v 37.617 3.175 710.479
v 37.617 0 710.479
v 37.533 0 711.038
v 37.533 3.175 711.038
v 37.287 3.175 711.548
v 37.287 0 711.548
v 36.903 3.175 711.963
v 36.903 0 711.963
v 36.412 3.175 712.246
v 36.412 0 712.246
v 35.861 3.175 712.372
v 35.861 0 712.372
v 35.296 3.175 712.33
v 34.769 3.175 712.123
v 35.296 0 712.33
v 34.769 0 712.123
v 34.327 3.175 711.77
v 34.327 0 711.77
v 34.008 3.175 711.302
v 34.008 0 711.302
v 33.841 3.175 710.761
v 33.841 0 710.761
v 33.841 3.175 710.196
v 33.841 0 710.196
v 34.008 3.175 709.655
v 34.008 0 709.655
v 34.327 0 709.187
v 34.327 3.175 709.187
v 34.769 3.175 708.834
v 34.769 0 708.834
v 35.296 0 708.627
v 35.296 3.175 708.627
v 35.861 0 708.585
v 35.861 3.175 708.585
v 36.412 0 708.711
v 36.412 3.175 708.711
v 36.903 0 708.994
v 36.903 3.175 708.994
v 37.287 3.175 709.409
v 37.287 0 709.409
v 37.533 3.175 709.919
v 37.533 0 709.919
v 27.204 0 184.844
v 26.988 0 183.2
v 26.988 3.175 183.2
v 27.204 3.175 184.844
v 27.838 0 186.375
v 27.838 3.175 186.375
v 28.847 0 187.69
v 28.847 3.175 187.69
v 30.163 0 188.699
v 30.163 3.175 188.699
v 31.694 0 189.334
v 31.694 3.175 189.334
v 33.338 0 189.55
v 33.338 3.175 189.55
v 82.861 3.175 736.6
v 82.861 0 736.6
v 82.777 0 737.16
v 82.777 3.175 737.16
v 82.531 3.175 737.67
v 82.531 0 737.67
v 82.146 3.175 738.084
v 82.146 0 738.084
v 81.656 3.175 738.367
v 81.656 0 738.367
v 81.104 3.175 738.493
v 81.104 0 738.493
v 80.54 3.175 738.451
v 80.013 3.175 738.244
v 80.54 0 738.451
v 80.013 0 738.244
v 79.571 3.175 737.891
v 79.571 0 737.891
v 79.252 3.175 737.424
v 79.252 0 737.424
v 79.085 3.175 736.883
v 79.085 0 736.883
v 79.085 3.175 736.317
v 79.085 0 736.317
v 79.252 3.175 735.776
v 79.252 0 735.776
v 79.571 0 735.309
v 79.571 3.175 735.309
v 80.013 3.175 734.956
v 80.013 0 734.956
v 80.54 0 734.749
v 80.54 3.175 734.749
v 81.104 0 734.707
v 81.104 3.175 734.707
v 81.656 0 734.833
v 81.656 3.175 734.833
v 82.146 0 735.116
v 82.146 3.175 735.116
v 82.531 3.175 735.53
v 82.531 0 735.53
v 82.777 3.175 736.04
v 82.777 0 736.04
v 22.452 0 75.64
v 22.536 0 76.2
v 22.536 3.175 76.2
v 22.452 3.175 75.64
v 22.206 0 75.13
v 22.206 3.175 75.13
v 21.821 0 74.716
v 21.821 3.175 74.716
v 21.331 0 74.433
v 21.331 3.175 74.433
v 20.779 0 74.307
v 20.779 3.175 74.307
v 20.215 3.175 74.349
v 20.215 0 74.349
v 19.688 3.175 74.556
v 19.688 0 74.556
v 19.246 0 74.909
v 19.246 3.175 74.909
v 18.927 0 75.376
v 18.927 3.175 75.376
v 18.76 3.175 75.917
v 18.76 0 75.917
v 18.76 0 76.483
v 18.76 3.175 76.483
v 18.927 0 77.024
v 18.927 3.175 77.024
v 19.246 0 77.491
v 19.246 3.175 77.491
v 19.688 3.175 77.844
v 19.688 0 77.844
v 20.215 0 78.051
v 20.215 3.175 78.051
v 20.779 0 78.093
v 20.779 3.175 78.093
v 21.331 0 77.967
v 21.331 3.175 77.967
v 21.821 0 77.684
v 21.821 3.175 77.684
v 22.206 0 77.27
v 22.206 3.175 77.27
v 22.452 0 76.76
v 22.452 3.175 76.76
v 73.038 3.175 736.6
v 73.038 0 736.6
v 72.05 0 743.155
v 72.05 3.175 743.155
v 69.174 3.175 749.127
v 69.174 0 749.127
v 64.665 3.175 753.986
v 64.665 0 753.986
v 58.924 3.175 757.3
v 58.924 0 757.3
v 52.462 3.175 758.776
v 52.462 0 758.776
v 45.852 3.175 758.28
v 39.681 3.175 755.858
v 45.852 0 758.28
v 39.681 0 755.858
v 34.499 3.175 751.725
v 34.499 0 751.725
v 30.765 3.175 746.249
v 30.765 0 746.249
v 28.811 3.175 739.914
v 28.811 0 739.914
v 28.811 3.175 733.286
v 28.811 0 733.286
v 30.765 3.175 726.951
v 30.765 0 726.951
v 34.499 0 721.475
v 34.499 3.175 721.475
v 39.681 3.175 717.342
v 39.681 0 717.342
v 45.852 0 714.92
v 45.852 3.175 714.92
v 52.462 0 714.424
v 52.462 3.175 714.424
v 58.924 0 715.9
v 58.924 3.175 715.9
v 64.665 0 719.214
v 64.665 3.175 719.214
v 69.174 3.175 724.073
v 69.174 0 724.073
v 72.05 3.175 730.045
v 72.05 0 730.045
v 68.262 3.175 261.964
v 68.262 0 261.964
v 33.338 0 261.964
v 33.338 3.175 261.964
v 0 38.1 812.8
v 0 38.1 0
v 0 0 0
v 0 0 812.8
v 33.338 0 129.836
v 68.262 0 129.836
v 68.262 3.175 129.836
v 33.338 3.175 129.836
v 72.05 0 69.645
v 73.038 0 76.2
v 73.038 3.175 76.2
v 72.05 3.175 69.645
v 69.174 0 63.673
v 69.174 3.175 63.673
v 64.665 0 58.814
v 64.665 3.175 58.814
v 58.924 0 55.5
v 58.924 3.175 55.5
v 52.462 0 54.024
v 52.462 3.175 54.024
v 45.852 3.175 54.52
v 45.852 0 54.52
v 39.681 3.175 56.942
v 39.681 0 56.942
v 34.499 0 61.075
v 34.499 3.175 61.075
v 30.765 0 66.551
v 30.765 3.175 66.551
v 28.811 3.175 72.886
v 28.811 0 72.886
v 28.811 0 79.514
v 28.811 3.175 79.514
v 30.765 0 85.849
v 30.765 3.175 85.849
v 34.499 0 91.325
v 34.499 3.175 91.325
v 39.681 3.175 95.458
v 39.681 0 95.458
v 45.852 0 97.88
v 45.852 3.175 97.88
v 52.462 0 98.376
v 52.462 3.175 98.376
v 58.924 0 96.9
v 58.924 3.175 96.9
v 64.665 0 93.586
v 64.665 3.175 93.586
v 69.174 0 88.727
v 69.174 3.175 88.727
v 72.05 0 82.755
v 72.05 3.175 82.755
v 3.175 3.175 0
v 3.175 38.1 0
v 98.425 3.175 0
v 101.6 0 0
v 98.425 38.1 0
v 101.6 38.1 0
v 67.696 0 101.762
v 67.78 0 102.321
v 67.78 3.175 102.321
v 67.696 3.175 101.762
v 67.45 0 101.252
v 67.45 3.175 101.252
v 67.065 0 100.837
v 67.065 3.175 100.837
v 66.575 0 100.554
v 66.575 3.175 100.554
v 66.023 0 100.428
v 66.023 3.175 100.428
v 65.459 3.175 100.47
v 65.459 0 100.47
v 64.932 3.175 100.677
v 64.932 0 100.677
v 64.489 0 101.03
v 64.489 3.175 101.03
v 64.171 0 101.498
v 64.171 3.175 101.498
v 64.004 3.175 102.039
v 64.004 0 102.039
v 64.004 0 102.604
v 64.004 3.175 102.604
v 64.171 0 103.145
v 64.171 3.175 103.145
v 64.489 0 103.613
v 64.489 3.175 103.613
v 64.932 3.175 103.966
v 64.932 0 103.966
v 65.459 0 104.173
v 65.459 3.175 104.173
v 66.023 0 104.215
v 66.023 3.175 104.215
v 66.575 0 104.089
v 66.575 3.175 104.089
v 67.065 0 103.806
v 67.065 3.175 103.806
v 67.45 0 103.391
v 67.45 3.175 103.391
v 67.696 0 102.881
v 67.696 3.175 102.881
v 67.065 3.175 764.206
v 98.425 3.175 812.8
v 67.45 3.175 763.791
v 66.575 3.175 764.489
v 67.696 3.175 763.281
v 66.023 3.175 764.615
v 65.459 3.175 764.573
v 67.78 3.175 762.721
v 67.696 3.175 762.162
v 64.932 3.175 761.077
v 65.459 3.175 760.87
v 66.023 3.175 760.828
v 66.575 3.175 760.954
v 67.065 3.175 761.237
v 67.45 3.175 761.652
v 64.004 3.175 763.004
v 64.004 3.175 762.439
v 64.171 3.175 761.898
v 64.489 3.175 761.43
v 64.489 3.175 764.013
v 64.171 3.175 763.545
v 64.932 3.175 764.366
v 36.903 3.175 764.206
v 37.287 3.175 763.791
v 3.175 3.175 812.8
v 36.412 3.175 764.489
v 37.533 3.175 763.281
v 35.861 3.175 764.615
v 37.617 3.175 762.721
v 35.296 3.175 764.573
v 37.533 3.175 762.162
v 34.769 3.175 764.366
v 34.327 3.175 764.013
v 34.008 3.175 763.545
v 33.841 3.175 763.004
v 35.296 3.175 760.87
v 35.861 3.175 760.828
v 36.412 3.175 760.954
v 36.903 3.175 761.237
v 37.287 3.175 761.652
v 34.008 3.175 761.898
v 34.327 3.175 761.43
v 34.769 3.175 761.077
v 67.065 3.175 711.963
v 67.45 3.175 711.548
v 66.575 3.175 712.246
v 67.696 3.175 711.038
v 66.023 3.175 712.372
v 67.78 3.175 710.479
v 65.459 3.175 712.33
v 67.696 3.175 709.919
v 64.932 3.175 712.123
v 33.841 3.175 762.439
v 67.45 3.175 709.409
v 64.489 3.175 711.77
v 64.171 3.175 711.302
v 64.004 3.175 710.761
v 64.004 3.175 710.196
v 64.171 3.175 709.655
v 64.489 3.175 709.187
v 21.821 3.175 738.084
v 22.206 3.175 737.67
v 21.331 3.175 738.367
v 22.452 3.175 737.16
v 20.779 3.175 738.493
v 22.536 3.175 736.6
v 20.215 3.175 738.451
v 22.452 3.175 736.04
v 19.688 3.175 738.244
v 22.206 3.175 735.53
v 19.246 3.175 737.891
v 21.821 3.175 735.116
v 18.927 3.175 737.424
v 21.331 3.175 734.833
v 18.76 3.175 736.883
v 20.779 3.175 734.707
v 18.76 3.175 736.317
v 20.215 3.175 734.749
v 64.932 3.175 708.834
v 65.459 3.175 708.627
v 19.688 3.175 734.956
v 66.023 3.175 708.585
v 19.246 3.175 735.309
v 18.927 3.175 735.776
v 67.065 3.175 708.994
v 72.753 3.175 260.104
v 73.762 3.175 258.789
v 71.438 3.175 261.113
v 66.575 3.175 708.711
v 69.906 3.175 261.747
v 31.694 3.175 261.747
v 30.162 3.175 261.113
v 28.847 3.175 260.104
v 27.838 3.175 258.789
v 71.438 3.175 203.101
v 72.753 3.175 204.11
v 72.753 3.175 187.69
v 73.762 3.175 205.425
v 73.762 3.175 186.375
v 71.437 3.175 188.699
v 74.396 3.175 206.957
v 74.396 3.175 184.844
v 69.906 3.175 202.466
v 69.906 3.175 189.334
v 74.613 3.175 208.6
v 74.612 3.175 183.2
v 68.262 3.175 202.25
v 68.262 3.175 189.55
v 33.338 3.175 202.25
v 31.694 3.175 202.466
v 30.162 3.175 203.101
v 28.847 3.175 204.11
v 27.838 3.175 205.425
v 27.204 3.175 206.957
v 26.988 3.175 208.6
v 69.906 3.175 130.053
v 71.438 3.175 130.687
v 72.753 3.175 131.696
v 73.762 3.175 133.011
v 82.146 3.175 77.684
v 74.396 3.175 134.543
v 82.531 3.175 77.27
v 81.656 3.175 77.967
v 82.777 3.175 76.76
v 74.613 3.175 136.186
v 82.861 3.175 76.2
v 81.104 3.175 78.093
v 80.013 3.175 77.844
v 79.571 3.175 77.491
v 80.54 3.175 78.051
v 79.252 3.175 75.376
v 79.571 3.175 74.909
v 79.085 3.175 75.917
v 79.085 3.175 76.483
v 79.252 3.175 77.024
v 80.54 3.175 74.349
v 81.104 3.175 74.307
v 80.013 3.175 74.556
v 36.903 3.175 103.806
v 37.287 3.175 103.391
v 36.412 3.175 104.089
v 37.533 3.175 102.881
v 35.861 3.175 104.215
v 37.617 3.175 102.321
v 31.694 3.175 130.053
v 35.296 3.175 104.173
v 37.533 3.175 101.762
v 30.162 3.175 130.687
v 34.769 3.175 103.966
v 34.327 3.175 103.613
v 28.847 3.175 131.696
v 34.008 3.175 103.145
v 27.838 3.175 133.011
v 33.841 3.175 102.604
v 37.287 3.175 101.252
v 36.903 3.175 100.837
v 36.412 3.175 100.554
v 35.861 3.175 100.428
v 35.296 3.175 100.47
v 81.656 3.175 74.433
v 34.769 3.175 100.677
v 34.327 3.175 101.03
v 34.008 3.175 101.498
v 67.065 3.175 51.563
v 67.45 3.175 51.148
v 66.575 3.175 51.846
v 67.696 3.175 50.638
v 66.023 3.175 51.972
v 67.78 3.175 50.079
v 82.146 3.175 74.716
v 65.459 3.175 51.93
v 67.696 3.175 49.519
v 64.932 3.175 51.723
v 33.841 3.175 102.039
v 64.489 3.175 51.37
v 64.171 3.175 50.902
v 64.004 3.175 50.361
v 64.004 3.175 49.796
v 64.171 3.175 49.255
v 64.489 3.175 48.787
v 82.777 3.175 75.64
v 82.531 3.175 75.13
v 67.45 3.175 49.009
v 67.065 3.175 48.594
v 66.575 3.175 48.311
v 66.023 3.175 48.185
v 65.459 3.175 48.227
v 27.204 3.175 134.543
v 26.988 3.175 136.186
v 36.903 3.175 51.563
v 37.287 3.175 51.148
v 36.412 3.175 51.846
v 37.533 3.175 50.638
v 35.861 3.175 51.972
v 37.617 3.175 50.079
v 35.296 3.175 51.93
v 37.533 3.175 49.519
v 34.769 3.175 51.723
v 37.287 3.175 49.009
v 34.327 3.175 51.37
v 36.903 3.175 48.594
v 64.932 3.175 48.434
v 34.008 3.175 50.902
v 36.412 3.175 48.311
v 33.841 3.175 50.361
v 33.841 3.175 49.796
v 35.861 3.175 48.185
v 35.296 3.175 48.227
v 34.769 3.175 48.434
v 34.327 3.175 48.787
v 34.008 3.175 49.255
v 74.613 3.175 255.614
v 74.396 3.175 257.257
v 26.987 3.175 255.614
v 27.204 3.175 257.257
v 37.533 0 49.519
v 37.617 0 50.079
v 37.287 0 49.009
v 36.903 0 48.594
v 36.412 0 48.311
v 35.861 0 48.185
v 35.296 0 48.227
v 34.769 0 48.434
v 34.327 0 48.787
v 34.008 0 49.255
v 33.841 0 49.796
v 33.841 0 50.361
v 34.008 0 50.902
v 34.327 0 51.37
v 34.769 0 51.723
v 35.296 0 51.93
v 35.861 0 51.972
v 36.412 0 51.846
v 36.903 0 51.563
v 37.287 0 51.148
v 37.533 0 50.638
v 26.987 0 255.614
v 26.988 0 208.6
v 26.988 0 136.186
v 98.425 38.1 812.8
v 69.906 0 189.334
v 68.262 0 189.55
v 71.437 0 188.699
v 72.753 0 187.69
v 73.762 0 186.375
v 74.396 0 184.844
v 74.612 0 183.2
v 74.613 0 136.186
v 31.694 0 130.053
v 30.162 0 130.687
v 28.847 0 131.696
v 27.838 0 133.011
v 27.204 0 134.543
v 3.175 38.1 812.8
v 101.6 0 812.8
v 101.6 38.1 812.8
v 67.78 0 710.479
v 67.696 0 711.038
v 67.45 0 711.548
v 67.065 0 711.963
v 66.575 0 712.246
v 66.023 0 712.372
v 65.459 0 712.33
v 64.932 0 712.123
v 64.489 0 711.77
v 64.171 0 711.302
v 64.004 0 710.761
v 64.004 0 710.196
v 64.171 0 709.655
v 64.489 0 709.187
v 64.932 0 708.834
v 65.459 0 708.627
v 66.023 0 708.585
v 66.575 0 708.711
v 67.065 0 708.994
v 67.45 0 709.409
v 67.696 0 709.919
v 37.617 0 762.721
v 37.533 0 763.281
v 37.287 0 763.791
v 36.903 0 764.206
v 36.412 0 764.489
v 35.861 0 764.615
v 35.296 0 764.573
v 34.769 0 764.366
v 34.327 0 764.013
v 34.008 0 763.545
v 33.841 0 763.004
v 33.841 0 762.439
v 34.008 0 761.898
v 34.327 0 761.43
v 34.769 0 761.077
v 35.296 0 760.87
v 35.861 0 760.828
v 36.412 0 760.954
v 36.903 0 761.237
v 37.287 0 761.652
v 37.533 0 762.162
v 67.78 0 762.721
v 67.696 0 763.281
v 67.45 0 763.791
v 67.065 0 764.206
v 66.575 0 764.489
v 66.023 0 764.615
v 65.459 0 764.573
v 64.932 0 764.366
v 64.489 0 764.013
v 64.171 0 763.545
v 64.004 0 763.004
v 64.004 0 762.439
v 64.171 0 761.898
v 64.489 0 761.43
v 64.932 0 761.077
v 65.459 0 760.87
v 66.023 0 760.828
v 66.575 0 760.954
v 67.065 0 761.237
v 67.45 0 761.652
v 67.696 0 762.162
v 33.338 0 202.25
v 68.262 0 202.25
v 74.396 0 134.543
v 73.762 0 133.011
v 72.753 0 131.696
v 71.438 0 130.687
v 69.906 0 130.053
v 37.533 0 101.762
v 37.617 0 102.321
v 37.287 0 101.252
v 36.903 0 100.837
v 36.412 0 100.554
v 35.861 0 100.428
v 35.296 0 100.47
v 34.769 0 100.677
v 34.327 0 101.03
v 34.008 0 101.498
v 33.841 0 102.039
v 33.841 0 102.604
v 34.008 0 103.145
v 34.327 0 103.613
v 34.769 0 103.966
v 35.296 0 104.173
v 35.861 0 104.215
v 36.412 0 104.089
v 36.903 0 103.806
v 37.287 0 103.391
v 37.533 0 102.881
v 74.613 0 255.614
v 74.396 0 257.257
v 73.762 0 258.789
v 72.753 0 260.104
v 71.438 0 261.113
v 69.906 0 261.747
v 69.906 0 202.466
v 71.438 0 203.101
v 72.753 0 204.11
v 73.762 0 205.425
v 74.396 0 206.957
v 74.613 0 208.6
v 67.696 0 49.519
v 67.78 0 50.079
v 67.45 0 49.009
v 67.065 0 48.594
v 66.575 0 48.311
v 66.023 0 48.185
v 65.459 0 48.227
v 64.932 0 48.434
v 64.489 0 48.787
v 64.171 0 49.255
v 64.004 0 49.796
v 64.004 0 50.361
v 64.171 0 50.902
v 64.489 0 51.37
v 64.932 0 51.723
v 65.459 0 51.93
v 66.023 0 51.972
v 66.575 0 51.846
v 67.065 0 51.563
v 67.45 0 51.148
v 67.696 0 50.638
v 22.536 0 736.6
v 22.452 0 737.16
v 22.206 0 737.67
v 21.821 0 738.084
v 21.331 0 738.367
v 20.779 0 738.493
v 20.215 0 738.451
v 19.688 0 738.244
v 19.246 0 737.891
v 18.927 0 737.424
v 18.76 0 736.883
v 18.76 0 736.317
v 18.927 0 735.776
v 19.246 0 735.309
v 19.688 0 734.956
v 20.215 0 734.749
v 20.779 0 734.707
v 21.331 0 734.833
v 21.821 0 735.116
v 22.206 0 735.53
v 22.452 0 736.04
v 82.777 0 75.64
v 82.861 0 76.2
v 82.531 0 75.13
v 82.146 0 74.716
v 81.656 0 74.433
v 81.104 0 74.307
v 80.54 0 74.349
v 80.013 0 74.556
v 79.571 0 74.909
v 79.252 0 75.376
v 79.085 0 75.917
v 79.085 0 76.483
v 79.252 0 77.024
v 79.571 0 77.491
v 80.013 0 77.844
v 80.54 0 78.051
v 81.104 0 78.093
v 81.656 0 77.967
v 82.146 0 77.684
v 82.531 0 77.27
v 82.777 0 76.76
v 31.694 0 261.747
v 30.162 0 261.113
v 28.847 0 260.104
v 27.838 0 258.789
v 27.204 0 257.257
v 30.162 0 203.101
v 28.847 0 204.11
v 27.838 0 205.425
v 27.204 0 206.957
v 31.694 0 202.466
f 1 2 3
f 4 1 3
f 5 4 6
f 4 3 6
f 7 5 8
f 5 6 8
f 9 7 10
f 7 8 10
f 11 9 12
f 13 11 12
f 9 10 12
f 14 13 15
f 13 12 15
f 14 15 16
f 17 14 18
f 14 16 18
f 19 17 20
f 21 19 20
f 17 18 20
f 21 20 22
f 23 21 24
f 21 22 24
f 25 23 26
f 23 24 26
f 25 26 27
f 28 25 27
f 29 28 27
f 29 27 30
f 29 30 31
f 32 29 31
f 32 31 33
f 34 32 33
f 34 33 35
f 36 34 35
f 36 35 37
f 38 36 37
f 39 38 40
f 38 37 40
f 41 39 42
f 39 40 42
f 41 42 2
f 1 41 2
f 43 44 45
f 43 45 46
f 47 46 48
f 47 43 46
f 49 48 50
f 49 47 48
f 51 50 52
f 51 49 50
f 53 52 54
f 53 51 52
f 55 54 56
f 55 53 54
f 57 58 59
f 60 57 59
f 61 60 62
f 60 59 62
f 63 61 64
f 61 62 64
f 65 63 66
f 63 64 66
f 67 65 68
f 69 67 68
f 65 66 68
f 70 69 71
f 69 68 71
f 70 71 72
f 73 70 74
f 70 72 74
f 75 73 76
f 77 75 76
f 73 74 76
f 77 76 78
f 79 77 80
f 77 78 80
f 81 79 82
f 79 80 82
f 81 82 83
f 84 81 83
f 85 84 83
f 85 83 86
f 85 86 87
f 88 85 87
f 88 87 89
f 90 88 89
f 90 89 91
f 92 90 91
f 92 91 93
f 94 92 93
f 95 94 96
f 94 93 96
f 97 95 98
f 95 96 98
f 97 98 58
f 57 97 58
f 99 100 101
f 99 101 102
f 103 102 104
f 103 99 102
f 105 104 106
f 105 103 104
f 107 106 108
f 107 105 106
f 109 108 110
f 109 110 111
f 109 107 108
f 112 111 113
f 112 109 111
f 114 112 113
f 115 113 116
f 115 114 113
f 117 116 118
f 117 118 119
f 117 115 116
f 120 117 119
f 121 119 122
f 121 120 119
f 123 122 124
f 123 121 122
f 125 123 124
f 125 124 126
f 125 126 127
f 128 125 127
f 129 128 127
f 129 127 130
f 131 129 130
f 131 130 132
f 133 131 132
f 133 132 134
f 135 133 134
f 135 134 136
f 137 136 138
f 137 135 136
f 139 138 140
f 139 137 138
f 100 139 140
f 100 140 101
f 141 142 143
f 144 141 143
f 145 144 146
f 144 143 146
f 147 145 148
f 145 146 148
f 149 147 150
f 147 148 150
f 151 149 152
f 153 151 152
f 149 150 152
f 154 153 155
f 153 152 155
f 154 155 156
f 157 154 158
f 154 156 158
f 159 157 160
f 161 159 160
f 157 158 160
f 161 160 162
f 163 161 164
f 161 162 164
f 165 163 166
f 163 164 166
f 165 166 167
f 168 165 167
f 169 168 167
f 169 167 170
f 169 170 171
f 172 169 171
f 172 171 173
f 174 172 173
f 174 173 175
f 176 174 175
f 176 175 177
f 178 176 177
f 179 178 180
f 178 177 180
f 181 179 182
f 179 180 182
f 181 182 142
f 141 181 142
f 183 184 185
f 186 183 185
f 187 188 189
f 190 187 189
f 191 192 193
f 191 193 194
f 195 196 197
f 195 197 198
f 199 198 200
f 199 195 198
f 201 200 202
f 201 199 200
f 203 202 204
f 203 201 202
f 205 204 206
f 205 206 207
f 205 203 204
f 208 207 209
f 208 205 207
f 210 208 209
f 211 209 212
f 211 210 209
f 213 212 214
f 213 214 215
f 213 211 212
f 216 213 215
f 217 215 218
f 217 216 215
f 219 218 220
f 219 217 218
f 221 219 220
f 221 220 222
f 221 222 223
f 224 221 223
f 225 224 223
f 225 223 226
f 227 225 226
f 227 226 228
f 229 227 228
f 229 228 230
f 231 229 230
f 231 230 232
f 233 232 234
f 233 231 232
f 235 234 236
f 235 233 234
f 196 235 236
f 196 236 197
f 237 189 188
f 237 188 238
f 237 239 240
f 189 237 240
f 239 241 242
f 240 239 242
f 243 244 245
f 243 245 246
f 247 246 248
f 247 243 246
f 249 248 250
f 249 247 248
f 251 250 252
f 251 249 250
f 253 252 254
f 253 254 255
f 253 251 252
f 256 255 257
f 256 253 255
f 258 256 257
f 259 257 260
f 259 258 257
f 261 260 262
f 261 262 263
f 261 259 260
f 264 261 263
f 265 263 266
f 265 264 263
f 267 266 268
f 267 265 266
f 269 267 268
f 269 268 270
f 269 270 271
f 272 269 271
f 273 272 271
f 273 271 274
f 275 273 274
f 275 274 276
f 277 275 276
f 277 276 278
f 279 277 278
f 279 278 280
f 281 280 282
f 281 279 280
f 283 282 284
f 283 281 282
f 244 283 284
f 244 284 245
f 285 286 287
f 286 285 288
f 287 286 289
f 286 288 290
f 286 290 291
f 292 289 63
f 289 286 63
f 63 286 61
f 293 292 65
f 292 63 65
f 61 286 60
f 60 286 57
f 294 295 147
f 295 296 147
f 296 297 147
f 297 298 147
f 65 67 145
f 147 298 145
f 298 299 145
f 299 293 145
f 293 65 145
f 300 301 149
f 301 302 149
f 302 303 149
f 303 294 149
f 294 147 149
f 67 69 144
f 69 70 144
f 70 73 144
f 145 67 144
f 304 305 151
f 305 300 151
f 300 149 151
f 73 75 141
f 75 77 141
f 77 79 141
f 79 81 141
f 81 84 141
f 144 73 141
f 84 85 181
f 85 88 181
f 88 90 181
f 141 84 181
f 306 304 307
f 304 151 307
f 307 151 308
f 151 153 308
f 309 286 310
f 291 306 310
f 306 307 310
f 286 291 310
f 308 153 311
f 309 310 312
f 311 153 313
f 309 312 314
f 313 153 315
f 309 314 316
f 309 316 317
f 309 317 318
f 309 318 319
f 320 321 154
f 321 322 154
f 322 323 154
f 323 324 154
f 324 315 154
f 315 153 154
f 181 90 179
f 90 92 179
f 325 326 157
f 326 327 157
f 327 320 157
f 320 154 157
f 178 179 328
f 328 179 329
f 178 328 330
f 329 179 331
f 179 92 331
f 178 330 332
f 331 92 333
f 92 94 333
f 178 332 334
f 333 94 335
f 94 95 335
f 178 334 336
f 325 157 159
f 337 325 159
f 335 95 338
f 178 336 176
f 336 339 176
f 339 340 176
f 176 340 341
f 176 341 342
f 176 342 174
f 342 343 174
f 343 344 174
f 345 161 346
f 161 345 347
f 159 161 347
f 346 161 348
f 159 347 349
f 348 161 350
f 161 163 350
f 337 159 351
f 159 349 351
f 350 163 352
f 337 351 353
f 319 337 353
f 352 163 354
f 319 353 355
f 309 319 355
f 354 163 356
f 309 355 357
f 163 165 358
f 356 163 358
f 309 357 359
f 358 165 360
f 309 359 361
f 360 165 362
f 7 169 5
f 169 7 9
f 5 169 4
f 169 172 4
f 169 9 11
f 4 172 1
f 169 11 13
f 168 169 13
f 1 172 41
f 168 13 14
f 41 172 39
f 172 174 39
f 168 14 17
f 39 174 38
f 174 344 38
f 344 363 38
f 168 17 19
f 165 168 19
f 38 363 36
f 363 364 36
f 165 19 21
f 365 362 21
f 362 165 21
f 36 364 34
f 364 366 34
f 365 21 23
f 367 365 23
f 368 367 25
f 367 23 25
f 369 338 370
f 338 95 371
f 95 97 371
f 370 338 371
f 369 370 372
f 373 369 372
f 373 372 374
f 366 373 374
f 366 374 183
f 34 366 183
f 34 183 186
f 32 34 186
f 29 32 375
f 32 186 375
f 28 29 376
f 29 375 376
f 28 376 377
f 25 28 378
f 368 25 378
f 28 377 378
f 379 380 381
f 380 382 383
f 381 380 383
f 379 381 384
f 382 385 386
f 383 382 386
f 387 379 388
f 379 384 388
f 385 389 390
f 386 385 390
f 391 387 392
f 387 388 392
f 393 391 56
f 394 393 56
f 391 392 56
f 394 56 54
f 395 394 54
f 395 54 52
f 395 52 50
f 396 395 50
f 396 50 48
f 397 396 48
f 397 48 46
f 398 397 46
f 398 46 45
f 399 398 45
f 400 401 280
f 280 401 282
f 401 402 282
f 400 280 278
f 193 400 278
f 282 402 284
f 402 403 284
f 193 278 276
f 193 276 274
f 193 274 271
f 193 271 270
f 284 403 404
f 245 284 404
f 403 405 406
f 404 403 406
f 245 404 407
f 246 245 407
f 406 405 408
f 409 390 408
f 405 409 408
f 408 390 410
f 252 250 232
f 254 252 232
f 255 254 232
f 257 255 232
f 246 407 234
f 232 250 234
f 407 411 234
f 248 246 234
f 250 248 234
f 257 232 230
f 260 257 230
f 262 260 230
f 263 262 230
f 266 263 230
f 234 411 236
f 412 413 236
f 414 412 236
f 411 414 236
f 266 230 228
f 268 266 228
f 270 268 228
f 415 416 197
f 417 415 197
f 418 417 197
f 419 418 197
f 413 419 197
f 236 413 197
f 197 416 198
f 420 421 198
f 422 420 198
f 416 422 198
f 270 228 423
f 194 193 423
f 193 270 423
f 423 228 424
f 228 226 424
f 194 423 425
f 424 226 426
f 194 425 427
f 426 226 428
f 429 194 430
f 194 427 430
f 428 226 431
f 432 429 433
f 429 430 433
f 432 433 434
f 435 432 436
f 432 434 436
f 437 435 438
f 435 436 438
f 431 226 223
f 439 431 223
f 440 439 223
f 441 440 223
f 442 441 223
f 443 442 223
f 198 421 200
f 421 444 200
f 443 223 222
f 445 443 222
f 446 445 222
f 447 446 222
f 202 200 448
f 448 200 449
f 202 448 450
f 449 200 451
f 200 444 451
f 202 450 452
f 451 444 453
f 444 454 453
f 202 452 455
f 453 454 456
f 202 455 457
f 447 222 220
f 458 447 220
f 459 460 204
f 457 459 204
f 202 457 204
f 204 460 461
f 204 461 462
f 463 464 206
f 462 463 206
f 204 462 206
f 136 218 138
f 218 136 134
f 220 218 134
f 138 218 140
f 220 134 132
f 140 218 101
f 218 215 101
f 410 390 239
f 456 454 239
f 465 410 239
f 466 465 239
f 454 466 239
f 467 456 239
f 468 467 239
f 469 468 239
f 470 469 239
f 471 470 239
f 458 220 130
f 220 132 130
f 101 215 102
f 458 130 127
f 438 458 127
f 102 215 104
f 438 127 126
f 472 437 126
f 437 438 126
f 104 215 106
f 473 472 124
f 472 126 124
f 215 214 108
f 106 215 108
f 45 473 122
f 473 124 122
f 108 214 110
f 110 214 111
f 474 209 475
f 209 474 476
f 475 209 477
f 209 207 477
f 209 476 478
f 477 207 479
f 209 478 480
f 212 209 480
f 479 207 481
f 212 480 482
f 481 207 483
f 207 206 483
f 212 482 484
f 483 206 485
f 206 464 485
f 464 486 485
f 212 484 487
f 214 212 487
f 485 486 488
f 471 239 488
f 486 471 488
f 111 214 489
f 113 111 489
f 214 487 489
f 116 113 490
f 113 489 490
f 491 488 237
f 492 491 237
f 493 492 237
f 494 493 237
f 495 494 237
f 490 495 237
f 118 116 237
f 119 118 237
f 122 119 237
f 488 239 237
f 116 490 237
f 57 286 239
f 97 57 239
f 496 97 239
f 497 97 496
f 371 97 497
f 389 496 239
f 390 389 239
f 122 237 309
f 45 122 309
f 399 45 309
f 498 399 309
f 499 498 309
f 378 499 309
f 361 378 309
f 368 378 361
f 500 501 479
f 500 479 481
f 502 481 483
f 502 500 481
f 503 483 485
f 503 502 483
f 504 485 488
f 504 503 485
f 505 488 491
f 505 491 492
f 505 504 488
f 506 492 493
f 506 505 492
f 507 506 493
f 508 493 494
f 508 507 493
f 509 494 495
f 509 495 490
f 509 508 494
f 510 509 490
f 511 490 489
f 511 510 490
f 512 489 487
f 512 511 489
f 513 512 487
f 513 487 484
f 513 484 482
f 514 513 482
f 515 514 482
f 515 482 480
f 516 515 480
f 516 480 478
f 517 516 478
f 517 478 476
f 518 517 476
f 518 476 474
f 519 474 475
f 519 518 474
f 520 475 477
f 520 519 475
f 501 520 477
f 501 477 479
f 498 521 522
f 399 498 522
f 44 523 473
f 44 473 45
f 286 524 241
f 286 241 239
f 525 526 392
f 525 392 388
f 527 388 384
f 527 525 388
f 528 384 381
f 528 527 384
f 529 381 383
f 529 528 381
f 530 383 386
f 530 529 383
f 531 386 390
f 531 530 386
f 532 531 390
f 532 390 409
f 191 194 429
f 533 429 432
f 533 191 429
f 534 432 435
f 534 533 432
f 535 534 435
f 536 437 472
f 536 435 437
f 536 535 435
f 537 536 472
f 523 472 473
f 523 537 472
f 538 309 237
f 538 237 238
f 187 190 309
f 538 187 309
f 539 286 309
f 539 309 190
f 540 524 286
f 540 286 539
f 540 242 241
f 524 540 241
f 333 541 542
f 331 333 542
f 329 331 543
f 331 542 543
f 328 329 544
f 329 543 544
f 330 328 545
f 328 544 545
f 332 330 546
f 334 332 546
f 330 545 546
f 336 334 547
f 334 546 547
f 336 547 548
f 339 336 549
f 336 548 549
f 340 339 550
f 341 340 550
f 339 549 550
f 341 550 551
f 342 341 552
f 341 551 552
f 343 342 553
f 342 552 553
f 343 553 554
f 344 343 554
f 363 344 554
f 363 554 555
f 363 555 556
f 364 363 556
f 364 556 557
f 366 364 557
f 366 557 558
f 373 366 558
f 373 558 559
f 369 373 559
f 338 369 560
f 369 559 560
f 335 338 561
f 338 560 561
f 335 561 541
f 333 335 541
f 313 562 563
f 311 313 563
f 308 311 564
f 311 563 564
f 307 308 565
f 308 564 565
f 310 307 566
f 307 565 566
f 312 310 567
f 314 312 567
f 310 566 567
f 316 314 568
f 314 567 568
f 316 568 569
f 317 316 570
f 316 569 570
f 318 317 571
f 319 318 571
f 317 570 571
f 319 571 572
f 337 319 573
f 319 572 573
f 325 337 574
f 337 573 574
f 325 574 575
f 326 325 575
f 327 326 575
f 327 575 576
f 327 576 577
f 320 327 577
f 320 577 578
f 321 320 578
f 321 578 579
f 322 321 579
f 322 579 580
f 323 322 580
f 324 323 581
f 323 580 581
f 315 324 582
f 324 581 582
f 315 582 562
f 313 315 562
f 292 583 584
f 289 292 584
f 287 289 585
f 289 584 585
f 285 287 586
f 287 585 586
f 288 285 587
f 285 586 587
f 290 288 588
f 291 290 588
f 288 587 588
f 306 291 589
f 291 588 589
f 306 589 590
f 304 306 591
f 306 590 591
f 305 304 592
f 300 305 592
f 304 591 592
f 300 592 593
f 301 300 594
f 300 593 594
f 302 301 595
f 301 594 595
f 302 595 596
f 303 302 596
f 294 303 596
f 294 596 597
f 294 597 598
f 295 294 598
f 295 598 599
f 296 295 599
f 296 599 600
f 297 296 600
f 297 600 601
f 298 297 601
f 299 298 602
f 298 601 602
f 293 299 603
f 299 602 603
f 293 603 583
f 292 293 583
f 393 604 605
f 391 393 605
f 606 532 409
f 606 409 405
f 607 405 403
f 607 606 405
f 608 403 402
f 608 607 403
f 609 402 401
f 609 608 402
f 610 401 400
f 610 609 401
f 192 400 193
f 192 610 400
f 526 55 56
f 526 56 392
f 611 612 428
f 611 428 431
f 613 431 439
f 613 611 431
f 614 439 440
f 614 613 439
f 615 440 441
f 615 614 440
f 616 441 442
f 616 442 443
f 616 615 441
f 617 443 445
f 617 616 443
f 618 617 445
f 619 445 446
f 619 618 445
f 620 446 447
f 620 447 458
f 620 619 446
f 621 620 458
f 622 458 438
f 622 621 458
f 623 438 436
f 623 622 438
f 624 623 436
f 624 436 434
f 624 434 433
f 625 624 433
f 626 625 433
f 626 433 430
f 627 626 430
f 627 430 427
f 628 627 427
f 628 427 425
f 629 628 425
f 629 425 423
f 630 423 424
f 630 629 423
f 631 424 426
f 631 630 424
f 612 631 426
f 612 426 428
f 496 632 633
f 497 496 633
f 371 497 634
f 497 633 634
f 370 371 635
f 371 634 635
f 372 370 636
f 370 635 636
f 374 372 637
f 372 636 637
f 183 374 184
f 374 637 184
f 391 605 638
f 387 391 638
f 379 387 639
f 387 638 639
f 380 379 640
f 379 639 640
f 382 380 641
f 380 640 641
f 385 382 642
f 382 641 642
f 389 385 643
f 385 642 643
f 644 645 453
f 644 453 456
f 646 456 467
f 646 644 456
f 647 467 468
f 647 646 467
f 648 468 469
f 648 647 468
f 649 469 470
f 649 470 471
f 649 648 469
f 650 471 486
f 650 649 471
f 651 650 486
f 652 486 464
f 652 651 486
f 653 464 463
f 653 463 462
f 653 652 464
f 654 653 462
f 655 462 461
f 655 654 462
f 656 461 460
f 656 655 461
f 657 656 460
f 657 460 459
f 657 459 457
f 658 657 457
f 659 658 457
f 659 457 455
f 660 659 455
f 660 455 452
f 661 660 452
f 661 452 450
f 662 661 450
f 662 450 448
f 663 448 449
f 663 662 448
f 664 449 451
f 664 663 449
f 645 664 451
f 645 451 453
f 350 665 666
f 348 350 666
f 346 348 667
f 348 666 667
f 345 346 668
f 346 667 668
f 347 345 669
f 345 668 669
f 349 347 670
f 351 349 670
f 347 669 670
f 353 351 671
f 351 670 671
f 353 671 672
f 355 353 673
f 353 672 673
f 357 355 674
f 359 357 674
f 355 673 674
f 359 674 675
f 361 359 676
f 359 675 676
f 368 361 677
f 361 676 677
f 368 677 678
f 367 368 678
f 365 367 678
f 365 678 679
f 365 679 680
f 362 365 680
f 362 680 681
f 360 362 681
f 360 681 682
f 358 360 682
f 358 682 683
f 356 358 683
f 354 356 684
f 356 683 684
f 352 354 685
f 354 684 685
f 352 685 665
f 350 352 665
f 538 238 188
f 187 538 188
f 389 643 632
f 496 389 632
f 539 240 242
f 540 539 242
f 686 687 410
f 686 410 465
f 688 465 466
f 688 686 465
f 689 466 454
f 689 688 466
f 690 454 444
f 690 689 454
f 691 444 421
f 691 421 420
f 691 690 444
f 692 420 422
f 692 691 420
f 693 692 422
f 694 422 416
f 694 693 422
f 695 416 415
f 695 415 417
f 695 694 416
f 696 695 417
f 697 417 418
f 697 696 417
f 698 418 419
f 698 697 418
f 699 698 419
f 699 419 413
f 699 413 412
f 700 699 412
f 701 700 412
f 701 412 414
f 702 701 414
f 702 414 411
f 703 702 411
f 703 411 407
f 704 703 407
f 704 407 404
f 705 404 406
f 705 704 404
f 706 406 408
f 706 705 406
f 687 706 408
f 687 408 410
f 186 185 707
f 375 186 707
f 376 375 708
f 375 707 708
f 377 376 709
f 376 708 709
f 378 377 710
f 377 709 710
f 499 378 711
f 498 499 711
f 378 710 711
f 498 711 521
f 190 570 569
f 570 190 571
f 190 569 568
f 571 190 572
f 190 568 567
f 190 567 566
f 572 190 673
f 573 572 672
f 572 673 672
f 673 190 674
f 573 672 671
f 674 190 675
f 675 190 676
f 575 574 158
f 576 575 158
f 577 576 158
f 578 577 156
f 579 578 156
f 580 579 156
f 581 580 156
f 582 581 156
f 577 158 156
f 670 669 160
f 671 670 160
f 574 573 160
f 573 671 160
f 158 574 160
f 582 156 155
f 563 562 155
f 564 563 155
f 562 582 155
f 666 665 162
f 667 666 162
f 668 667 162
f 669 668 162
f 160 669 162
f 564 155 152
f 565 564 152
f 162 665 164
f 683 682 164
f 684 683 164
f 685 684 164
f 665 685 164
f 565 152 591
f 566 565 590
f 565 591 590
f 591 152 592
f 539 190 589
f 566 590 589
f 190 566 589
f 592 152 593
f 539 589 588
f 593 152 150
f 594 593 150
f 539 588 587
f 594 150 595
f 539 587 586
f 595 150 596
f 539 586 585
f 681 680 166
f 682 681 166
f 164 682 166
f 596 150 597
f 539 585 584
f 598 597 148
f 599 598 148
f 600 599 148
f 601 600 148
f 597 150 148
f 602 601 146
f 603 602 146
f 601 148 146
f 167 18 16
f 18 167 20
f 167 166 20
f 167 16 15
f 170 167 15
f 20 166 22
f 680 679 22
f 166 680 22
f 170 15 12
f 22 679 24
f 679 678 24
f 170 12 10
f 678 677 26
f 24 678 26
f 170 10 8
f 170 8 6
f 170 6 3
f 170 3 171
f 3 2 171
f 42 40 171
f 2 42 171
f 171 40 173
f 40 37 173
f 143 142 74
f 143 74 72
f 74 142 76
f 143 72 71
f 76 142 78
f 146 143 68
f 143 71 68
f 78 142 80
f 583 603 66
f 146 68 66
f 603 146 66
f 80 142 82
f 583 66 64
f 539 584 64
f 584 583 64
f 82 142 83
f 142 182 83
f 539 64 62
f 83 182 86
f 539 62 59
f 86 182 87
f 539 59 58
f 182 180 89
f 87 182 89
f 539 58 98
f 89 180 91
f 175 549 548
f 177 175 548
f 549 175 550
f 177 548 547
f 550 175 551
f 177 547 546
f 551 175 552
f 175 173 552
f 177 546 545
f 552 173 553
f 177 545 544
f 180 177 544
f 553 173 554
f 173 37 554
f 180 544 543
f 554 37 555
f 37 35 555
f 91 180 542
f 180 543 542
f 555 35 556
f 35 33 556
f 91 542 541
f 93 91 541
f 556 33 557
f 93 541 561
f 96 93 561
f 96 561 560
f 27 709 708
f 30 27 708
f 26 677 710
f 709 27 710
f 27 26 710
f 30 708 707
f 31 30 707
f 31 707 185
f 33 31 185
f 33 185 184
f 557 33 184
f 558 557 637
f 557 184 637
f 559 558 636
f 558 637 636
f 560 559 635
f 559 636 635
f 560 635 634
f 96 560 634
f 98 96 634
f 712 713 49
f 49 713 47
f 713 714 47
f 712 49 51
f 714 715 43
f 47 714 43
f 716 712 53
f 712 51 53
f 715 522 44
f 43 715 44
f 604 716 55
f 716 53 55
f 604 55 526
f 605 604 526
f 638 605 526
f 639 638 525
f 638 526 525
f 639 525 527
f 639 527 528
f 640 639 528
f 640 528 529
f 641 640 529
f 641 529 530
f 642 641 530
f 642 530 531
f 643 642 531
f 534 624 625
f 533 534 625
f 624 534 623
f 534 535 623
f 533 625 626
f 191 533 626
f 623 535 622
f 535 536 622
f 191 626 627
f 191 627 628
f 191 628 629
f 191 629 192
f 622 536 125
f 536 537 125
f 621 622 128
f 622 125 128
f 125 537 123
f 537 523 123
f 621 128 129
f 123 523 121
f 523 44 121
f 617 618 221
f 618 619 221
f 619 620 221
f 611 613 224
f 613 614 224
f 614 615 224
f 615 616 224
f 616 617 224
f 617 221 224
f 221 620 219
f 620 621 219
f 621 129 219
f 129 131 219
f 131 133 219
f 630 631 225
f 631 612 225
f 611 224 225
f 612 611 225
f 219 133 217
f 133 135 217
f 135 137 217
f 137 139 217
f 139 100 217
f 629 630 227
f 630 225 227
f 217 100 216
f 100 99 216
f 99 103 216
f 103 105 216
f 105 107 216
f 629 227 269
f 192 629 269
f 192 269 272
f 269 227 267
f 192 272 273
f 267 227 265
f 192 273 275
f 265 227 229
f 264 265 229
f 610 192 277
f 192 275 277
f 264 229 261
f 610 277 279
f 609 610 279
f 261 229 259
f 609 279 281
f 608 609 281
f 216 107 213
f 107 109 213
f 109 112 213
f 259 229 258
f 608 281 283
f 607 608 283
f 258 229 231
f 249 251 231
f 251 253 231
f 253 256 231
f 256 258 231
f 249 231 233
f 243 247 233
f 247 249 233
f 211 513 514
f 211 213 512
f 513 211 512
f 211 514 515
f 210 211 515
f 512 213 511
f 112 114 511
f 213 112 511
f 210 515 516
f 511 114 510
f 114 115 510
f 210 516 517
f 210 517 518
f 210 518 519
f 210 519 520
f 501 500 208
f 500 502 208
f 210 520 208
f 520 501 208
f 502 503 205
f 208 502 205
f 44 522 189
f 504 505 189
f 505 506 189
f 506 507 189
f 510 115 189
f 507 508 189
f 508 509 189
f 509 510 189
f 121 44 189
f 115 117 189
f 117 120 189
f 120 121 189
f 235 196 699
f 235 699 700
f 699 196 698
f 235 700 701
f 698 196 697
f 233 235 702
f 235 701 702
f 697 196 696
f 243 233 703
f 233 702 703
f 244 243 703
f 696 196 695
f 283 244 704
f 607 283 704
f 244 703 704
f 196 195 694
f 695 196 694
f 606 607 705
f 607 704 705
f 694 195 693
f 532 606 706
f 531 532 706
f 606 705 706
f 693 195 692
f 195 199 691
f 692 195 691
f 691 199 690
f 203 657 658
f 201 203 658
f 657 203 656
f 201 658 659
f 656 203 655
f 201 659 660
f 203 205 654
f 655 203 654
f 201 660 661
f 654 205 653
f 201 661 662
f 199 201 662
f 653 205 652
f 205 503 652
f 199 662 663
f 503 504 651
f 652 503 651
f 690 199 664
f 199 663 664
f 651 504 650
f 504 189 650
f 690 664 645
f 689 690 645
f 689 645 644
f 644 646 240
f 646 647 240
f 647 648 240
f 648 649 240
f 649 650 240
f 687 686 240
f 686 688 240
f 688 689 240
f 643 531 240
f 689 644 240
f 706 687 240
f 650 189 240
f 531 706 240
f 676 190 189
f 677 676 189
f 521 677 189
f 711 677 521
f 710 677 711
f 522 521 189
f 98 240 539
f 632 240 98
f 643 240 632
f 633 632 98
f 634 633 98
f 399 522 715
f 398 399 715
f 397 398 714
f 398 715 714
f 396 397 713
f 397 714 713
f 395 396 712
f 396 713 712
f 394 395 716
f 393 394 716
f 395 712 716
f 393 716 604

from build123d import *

# Parameters (mm, degrees)
BOSS_EXTRUDE1_DEPTH = 812.8
SKETCH2_R           = 22.2377
CUT_EXTRUDE1_DEPTH  = 3.175
SKETCH3_R           = 1.89865
CUT_EXTRUDE2_DEPTH  = 3.175
CUT_EXTRUDE3_REACH  = 40.1


with BuildPart() as part:
    # Sketch1 → Boss-Extrude1 (new body)
    with BuildSketch(Plane.XY):
        Polygon((3.175, 3.175), (3.175, 38.1), (0, 38.1), (0, 0), (101.6, 0), (101.6, 38.1), (98.425, 38.1), (98.425, 3.175), align=None)
    extrude(amount=BOSS_EXTRUDE1_DEPTH)

    # Sketch2 → Cut-Extrude1 (cut)
    with BuildSketch(Plane.XZ):
        with Locations((50.8, 736.6)):
            Circle(SKETCH2_R)
    cut_extrude1 = extrude(amount=-CUT_EXTRUDE1_DEPTH, mode=Mode.SUBTRACT)

    # Sketch3 → Cut-Extrude2 (cut)
    with BuildSketch(Plane.XZ):
        with Locations((65.88125, 762.721491242)):
            Circle(SKETCH3_R)
        with Locations((80.9625, 736.6)):
            Circle(SKETCH3_R)
        with Locations((65.88125, 710.478508758)):
            Circle(SKETCH3_R)
        with Locations((35.71875, 710.478508758)):
            Circle(SKETCH3_R)
        with Locations((20.6375, 736.6)):
            Circle(SKETCH3_R)
        with Locations((35.71875, 762.721491242)):
            Circle(SKETCH3_R)
    cut_extrude2 = extrude(amount=-CUT_EXTRUDE2_DEPTH, mode=Mode.SUBTRACT)

    # Mirror1: Cut-Extrude1, Cut-Extrude2 across plane
    add(cut_extrude1.mirror(Plane.XY.offset(406.4)), mode=Mode.SUBTRACT)
    add(cut_extrude2.mirror(Plane.XY.offset(406.4)), mode=Mode.SUBTRACT)

    # Sketch4 → Cut-Extrude3 (cut, up to next)
    with BuildSketch(Plane.XZ, mode=Mode.PRIVATE) as cut_extrude3_sk1:
        with BuildLine():
            Line((68.2625, 129.836281806), (33.3375, 129.836281806))
            ThreePointArc((33.3375, 129.836281806), (28.847371939, 131.696153745), (26.9875, 136.186281806))
            Line((26.9875, 136.186281806), (26.9875, 183.200007549))
            ThreePointArc((26.9875, 183.200007549), (28.847371939, 187.690135609), (33.3375, 189.550007549))
            Line((33.3375, 189.550007549), (68.2625, 189.550007549))
            ThreePointArc((68.2625, 189.550007549), (72.752628061, 187.690135609), (74.6125, 183.200007549))
            Line((74.6125, 183.200007549), (74.6125, 136.186281806))
            ThreePointArc((74.6125, 136.186281806), (72.752628061, 131.696153745), (68.2625, 129.836281806))
        make_face()
    cut_extrude3_tool1 = extrude(cut_extrude3_sk1.sketch, amount=-CUT_EXTRUDE3_REACH, mode=Mode.PRIVATE) & part.part
    add(cut_extrude3_tool1.solids().sort_by_distance((50.8, 0, 159.693145))[0], mode=Mode.SUBTRACT)
    # Sketch4 → Cut-Extrude3 (cut, up to next)
    with BuildSketch(Plane.XZ, mode=Mode.PRIVATE) as cut_extrude3_sk2:
        with BuildLine():
            Line((68.2625, 261.963733292), (33.3375, 261.963733292))
            ThreePointArc((33.3375, 261.963733292), (28.847371939, 260.103861353), (26.9875, 255.613733292))
            Line((26.9875, 255.613733292), (26.9875, 208.600007549))
            ThreePointArc((26.9875, 208.600007549), (28.847371939, 204.109879488), (33.3375, 202.250007549))
            Line((33.3375, 202.250007549), (68.2625, 202.250007549))
            ThreePointArc((68.2625, 202.250007549), (72.752628061, 204.109879488), (74.6125, 208.600007549))
            Line((74.6125, 208.600007549), (74.6125, 255.613733292))
            ThreePointArc((74.6125, 255.613733292), (72.752628061, 260.103861353), (68.2625, 261.963733292))
        make_face()
    cut_extrude3_tool2 = extrude(cut_extrude3_sk2.sketch, amount=-CUT_EXTRUDE3_REACH, mode=Mode.PRIVATE) & part.part
    add(cut_extrude3_tool2.solids().sort_by_distance((50.8, 0, 232.10687))[0], mode=Mode.SUBTRACT)


solid = part.part
